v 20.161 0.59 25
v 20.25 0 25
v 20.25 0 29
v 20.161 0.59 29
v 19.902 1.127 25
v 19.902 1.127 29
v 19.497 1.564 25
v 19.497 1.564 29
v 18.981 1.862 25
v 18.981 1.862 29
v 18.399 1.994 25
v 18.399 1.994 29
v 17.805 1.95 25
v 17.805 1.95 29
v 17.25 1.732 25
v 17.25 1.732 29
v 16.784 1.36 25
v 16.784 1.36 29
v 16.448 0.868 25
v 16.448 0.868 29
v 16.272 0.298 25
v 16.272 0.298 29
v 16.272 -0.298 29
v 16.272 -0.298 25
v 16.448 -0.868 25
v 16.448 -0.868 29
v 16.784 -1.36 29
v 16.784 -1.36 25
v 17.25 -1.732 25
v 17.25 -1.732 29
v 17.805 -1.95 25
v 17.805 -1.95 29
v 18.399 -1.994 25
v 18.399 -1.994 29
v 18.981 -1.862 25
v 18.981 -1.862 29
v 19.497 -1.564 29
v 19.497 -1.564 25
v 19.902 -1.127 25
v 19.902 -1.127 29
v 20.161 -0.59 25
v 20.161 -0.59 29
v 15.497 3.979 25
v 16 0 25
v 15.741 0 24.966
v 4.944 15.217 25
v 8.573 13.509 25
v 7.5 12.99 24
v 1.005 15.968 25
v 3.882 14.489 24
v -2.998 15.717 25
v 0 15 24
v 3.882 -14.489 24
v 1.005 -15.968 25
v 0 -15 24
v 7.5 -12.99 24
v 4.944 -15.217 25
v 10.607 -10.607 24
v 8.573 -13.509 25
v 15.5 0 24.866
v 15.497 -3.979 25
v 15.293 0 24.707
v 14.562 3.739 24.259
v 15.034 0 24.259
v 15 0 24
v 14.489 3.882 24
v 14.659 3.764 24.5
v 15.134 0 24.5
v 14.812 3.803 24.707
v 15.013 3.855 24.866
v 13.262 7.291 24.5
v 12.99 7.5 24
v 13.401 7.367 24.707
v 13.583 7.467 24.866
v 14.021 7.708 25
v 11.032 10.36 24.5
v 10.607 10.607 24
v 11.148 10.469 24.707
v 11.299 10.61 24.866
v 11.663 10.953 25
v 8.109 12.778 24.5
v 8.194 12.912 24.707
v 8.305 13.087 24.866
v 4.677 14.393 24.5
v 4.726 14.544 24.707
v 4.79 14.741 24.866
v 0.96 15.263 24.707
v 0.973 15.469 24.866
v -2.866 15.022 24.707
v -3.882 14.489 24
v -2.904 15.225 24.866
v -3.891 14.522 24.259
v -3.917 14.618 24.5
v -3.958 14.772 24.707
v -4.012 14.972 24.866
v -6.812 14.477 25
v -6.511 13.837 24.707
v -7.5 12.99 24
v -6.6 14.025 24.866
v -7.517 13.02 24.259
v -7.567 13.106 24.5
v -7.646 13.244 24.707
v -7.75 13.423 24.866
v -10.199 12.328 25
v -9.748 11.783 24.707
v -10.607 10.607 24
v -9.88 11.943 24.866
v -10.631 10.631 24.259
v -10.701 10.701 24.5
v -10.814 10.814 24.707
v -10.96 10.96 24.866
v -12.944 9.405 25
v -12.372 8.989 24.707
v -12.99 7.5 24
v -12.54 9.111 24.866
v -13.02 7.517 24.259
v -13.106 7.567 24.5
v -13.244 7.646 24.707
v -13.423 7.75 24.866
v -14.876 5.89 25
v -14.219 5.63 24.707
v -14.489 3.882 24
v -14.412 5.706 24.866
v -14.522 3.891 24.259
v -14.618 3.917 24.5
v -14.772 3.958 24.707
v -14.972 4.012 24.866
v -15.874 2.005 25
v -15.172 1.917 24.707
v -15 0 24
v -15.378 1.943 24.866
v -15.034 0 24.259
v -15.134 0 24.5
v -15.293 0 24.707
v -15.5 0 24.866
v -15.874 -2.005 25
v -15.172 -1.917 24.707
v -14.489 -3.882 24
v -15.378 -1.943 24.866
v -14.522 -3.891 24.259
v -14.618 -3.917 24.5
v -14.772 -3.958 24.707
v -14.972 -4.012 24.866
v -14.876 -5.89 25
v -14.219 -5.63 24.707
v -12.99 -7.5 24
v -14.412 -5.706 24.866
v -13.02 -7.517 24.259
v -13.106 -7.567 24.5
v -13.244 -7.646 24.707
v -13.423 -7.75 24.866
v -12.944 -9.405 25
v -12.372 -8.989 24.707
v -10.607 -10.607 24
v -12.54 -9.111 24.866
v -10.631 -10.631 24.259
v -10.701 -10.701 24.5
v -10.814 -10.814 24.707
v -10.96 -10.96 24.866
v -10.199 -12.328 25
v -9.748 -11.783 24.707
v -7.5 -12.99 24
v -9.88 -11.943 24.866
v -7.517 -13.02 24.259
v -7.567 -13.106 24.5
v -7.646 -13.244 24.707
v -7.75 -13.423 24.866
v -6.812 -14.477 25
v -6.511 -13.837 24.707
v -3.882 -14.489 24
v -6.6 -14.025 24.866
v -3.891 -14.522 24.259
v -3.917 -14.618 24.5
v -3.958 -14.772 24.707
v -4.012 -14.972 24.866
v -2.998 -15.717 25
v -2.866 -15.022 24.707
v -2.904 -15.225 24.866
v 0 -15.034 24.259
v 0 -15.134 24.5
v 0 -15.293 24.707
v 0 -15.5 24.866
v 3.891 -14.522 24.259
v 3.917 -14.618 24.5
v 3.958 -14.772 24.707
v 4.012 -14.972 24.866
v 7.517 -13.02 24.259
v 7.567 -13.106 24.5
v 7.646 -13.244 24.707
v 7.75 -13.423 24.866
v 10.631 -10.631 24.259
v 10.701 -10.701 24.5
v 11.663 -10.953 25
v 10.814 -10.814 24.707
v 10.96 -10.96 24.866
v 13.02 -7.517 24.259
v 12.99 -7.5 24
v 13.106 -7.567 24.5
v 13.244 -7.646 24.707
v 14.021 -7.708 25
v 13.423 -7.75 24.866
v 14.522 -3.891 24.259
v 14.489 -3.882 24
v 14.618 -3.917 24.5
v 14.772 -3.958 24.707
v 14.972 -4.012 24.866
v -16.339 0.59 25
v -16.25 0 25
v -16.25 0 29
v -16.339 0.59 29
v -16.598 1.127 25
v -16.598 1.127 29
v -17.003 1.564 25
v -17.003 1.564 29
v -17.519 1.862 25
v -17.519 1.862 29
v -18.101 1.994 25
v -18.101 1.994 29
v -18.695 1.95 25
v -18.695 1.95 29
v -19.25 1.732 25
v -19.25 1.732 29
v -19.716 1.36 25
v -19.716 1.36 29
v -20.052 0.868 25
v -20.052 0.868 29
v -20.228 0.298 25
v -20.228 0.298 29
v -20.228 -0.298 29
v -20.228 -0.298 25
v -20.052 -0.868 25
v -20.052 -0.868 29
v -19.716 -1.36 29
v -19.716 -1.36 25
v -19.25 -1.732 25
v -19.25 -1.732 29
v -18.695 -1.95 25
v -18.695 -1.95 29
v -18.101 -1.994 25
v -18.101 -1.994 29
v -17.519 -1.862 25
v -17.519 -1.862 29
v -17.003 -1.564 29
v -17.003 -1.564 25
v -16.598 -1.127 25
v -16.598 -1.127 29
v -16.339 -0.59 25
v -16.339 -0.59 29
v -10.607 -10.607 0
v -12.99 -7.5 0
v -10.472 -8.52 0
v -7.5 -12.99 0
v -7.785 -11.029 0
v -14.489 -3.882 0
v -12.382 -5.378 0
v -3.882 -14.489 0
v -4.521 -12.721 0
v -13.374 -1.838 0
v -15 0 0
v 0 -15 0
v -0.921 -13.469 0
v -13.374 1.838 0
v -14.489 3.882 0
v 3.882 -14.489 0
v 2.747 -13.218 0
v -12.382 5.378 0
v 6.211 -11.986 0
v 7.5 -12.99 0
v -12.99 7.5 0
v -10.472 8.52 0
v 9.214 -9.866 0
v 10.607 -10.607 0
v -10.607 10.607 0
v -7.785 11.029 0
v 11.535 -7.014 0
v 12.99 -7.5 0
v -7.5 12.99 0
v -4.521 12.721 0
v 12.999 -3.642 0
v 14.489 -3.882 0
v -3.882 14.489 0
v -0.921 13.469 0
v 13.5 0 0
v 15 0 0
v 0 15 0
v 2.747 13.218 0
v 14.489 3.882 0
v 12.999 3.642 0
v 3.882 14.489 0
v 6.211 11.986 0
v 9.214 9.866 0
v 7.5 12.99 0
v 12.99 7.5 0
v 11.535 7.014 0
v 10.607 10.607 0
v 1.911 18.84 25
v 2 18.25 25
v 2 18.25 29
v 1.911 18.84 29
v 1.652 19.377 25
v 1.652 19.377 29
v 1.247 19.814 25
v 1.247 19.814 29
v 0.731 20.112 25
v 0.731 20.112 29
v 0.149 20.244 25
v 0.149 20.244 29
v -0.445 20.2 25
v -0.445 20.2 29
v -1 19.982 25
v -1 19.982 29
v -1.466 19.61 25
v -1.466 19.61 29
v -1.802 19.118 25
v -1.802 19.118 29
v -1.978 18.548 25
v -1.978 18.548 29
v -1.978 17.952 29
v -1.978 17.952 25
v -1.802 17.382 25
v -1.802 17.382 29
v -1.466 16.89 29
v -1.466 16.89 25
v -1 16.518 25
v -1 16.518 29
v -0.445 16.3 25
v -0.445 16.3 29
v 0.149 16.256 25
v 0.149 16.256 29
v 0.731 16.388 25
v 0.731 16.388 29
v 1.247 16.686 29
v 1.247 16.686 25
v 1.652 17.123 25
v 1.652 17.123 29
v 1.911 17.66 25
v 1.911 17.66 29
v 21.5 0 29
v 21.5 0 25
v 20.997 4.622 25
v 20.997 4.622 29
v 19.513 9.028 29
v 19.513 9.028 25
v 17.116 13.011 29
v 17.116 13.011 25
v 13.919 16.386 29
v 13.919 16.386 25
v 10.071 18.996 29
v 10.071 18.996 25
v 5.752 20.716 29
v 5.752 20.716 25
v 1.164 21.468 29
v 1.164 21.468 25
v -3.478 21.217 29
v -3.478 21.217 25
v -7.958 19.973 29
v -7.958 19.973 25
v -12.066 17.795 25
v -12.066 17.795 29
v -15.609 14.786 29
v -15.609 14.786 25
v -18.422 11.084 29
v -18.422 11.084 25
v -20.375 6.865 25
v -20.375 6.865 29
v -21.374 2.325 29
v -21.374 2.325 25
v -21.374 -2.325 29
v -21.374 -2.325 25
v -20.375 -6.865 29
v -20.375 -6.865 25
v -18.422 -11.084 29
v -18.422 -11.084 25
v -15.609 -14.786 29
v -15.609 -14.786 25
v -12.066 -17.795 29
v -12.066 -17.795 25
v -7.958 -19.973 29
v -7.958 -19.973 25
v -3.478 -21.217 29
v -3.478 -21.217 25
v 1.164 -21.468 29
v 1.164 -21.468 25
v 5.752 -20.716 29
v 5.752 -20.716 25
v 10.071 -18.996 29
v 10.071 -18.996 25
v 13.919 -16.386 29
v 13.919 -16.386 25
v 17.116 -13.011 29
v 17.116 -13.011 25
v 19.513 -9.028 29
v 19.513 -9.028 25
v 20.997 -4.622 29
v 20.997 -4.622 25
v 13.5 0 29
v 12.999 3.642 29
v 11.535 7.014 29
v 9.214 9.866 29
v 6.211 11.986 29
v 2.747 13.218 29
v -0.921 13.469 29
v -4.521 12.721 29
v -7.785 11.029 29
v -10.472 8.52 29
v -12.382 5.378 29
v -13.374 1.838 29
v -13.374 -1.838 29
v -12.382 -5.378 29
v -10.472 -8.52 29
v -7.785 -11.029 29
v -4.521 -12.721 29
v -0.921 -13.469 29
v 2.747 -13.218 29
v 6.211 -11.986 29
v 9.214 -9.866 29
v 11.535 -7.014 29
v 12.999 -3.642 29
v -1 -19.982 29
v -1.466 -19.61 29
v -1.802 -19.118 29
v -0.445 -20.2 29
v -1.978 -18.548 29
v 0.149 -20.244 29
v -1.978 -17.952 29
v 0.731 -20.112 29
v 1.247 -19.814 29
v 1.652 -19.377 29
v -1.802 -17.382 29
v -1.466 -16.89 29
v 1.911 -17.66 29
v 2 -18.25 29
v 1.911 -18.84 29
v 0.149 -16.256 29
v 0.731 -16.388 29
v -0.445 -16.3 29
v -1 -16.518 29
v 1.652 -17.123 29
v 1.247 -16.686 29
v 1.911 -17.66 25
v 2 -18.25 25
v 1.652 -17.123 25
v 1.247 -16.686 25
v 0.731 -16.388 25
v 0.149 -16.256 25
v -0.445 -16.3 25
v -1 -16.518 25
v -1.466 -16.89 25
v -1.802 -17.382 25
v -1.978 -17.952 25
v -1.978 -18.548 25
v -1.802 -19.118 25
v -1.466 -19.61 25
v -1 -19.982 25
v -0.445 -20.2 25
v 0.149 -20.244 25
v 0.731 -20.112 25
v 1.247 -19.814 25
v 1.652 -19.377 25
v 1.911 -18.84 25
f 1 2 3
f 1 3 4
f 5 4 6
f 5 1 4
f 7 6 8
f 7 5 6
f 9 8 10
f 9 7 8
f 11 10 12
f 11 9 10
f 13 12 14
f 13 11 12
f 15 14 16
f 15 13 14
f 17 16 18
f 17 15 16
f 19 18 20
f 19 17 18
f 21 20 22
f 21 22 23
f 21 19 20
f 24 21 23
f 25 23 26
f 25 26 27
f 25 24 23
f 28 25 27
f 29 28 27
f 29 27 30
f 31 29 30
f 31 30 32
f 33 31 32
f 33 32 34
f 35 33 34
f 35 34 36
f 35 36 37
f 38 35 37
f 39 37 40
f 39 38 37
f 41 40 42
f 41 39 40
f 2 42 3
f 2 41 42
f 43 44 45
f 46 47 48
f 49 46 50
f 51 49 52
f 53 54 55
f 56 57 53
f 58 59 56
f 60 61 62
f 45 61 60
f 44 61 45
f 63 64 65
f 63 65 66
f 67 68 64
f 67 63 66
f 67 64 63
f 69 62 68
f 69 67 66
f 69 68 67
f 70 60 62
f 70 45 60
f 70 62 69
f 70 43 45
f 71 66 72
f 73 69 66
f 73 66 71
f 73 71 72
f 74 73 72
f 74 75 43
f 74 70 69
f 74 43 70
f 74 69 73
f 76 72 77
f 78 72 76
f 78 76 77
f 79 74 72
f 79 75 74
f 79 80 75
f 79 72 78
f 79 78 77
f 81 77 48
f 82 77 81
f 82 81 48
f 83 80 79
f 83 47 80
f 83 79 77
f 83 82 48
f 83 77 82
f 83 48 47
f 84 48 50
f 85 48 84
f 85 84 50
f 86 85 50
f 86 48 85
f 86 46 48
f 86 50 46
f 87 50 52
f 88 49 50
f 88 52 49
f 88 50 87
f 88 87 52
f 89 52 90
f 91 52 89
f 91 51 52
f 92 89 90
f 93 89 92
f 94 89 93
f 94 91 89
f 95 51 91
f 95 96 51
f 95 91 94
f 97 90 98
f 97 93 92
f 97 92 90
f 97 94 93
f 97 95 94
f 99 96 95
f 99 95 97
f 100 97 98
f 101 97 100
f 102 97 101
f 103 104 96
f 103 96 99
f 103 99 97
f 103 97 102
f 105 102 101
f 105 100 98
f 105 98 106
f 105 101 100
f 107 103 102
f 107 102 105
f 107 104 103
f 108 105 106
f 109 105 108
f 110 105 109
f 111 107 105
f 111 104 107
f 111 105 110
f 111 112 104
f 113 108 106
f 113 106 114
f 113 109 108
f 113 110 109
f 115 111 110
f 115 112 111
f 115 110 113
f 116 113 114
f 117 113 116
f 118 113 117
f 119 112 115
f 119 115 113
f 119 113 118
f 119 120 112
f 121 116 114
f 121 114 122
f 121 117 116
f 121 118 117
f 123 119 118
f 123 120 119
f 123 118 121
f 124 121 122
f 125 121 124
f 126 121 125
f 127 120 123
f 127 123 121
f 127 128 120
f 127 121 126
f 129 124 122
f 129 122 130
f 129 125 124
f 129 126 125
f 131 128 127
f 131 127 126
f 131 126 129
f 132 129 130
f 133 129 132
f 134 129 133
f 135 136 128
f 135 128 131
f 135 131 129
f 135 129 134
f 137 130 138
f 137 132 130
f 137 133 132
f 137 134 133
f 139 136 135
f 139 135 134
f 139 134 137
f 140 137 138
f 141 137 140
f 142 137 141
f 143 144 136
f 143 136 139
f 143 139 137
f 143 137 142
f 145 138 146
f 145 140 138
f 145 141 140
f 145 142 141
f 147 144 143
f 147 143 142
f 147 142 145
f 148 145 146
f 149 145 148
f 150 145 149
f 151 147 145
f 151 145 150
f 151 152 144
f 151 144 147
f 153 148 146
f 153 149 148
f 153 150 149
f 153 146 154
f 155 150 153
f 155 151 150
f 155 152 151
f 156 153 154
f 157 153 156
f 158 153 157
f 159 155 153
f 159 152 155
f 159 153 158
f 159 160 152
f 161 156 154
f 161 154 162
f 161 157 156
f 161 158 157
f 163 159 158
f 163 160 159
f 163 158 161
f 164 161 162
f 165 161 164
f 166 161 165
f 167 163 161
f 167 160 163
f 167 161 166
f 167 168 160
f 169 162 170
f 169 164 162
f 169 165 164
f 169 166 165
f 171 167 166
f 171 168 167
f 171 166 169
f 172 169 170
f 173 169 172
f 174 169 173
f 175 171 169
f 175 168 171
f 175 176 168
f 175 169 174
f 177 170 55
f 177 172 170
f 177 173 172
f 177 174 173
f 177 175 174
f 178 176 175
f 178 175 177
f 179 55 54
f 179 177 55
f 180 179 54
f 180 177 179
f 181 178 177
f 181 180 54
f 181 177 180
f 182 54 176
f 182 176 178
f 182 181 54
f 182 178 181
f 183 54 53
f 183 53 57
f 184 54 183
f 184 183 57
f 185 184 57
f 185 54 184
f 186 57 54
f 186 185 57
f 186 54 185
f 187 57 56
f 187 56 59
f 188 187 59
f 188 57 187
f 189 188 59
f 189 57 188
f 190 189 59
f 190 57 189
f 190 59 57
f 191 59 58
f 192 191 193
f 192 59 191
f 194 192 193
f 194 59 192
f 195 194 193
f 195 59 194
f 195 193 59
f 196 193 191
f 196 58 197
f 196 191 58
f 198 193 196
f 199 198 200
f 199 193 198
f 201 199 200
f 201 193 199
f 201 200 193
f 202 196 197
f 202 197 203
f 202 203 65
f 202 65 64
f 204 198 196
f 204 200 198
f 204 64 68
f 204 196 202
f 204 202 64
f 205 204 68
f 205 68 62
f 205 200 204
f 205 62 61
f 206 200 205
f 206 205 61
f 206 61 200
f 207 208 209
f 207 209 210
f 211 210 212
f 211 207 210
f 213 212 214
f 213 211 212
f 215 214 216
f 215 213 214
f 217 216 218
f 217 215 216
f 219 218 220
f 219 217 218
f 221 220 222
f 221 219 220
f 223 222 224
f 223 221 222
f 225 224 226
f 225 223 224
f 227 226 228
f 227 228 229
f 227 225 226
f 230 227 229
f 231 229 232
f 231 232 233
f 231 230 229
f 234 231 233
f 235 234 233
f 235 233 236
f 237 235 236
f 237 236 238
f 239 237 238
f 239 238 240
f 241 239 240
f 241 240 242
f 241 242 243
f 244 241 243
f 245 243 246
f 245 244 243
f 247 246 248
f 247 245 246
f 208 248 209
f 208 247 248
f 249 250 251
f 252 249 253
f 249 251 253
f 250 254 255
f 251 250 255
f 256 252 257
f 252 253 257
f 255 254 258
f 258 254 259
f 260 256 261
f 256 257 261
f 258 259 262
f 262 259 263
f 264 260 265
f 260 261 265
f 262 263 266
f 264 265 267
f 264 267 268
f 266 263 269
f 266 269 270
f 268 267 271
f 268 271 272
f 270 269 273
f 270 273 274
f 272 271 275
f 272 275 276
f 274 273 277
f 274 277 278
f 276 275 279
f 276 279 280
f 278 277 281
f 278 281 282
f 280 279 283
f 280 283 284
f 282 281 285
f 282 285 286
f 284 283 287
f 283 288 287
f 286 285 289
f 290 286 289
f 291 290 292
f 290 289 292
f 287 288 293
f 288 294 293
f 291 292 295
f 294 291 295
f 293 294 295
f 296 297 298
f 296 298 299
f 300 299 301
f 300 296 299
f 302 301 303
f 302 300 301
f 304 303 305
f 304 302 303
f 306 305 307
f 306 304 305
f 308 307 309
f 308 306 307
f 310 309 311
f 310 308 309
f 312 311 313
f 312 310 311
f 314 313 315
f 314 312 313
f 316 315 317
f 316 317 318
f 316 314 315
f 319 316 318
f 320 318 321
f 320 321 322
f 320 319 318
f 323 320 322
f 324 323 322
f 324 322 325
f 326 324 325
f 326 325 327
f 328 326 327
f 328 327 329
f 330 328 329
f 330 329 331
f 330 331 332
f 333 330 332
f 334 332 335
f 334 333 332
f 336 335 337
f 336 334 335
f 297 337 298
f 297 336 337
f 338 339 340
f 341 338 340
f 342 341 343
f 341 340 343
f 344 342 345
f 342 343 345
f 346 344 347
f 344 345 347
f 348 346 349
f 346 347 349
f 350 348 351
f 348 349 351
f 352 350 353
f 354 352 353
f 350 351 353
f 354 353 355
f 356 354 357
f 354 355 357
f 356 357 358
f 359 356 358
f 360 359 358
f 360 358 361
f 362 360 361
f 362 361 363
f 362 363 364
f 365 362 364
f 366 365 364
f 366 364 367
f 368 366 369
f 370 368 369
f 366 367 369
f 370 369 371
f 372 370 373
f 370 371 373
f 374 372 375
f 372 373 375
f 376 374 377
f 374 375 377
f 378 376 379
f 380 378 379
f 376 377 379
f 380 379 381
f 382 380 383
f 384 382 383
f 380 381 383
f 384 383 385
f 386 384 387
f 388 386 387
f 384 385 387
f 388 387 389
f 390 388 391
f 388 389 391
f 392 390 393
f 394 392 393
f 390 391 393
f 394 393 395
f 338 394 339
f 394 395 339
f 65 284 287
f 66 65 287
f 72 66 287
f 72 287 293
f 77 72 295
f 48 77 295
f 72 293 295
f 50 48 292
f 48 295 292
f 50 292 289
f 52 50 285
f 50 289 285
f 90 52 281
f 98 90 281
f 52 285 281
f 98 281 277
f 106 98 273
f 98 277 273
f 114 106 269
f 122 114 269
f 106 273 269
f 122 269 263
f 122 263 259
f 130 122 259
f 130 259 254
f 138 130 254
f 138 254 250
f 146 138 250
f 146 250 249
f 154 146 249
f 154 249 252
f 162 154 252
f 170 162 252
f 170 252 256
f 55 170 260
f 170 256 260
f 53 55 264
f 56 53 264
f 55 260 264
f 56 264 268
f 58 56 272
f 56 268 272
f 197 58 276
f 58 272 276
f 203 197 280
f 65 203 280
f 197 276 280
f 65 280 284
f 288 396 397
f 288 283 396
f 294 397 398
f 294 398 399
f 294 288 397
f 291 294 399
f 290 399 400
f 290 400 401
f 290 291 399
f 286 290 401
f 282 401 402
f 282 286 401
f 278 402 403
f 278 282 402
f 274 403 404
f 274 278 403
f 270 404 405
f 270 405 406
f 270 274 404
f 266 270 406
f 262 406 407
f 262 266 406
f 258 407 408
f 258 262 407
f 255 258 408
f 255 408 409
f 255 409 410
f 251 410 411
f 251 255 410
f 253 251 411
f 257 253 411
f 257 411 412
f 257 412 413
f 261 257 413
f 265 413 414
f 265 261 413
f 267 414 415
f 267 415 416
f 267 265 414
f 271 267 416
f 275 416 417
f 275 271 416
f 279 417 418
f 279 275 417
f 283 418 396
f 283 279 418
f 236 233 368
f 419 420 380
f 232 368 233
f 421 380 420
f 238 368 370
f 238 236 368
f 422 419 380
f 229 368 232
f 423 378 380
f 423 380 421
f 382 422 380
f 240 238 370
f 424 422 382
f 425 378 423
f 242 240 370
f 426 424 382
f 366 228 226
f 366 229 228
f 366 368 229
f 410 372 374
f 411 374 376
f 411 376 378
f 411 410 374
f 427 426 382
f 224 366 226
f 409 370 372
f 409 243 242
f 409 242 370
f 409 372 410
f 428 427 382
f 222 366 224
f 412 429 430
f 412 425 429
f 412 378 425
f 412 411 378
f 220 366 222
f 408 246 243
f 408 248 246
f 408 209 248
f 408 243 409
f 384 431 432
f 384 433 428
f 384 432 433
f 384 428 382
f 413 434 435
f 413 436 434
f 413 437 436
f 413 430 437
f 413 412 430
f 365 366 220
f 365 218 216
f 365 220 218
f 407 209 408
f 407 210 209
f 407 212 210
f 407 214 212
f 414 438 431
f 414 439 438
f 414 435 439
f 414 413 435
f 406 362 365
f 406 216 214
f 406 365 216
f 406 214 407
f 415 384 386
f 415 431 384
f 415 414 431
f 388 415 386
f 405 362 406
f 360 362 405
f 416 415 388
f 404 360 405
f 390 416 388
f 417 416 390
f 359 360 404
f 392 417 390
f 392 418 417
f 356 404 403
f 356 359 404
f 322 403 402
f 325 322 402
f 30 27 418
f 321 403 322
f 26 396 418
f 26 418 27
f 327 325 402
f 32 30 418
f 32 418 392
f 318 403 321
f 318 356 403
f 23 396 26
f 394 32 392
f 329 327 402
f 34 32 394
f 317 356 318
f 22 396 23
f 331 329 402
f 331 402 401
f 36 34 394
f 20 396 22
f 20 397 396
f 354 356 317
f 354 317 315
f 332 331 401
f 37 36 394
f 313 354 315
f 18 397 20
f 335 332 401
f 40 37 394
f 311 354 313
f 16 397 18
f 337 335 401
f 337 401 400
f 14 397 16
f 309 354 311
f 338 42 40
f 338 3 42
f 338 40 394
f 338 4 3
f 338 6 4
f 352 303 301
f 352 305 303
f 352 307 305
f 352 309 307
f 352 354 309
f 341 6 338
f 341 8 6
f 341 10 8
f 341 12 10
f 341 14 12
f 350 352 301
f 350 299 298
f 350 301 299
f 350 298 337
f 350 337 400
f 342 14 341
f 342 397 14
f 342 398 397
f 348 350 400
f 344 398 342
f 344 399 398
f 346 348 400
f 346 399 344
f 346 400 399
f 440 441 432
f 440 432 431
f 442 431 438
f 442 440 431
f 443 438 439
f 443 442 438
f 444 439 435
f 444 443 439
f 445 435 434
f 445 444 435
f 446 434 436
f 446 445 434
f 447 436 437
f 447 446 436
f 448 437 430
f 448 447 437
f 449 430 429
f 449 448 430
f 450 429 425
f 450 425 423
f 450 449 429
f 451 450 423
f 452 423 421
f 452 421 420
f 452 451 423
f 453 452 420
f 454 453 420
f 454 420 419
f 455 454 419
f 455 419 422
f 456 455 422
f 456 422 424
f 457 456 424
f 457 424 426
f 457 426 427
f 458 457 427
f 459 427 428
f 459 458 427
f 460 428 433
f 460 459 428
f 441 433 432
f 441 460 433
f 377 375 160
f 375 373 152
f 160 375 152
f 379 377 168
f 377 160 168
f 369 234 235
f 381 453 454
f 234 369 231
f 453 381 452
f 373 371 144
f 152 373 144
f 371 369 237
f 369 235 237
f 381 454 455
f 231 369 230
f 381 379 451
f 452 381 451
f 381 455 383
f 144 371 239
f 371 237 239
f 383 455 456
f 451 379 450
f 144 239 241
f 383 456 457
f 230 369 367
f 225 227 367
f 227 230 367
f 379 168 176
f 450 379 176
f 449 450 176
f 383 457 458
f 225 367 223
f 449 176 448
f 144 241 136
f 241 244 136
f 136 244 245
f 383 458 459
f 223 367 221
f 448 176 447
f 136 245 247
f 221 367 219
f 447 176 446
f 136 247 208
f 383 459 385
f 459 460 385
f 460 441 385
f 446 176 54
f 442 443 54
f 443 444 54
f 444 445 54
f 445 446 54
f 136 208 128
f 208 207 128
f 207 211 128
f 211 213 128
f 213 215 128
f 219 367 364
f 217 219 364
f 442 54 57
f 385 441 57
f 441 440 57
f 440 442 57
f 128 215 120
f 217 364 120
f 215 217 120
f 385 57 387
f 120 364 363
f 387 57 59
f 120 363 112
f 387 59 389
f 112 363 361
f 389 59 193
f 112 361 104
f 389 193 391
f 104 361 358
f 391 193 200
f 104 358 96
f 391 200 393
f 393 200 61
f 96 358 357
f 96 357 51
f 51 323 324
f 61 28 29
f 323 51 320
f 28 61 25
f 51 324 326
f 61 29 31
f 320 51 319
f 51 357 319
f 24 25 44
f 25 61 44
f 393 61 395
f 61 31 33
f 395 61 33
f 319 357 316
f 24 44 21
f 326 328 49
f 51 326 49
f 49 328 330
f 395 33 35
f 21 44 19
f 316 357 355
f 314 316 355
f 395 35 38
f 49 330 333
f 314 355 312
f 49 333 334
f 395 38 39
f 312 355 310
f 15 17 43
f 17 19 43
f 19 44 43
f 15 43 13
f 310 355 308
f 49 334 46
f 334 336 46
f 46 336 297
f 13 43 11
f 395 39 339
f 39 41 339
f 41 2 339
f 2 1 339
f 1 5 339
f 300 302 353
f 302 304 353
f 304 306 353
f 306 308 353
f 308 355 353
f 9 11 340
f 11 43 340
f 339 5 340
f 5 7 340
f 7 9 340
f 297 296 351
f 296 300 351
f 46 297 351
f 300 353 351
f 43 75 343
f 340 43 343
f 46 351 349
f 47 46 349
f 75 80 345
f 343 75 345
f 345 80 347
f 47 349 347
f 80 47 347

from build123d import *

# Parameters (mm, degrees)
SKETCH_1_R      = 15
SKETCH_1_R_2    = 13.5
EXTRUDE_1_DEPTH = 25
SKETCH_2_R      = 21.5
SKETCH_2_R_2    = 13.5
SKETCH_2_R_3    = 2
EXTRUDE_3_DEPTH = 4
FILLET_2_R      = 1


with BuildPart() as part:
    # 草图1 → 凸台-拉伸1 (new body)
    with BuildSketch(Plane.XY):
        Circle(SKETCH_1_R)
        Circle(SKETCH_1_R_2, mode=Mode.SUBTRACT)
    extrude(amount=EXTRUDE_1_DEPTH)

    # 草图2 → 凸台-拉伸3 (add)
    with BuildSketch(Plane.XY.offset(25)):
        Circle(SKETCH_2_R)
        Circle(SKETCH_2_R_2, mode=Mode.SUBTRACT)
        with Locations((0, 18.25)):
            Circle(SKETCH_2_R_3, mode=Mode.SUBTRACT)
        with Locations((18.25, 0)):
            Circle(SKETCH_2_R_3, mode=Mode.SUBTRACT)
        with Locations((0, -18.25)):
            Circle(SKETCH_2_R_3, mode=Mode.SUBTRACT)
        with Locations((-18.25, 0)):
            Circle(SKETCH_2_R_3, mode=Mode.SUBTRACT)
    extrude(amount=EXTRUDE_3_DEPTH)

    # 圆角2
    fillet_2_edges = [part.edges().sort_by_distance(p)[0] for p in [
        (-15, 0, 25),
    ]]
    fillet(fillet_2_edges, radius=FILLET_2_R)


solid = part.part
